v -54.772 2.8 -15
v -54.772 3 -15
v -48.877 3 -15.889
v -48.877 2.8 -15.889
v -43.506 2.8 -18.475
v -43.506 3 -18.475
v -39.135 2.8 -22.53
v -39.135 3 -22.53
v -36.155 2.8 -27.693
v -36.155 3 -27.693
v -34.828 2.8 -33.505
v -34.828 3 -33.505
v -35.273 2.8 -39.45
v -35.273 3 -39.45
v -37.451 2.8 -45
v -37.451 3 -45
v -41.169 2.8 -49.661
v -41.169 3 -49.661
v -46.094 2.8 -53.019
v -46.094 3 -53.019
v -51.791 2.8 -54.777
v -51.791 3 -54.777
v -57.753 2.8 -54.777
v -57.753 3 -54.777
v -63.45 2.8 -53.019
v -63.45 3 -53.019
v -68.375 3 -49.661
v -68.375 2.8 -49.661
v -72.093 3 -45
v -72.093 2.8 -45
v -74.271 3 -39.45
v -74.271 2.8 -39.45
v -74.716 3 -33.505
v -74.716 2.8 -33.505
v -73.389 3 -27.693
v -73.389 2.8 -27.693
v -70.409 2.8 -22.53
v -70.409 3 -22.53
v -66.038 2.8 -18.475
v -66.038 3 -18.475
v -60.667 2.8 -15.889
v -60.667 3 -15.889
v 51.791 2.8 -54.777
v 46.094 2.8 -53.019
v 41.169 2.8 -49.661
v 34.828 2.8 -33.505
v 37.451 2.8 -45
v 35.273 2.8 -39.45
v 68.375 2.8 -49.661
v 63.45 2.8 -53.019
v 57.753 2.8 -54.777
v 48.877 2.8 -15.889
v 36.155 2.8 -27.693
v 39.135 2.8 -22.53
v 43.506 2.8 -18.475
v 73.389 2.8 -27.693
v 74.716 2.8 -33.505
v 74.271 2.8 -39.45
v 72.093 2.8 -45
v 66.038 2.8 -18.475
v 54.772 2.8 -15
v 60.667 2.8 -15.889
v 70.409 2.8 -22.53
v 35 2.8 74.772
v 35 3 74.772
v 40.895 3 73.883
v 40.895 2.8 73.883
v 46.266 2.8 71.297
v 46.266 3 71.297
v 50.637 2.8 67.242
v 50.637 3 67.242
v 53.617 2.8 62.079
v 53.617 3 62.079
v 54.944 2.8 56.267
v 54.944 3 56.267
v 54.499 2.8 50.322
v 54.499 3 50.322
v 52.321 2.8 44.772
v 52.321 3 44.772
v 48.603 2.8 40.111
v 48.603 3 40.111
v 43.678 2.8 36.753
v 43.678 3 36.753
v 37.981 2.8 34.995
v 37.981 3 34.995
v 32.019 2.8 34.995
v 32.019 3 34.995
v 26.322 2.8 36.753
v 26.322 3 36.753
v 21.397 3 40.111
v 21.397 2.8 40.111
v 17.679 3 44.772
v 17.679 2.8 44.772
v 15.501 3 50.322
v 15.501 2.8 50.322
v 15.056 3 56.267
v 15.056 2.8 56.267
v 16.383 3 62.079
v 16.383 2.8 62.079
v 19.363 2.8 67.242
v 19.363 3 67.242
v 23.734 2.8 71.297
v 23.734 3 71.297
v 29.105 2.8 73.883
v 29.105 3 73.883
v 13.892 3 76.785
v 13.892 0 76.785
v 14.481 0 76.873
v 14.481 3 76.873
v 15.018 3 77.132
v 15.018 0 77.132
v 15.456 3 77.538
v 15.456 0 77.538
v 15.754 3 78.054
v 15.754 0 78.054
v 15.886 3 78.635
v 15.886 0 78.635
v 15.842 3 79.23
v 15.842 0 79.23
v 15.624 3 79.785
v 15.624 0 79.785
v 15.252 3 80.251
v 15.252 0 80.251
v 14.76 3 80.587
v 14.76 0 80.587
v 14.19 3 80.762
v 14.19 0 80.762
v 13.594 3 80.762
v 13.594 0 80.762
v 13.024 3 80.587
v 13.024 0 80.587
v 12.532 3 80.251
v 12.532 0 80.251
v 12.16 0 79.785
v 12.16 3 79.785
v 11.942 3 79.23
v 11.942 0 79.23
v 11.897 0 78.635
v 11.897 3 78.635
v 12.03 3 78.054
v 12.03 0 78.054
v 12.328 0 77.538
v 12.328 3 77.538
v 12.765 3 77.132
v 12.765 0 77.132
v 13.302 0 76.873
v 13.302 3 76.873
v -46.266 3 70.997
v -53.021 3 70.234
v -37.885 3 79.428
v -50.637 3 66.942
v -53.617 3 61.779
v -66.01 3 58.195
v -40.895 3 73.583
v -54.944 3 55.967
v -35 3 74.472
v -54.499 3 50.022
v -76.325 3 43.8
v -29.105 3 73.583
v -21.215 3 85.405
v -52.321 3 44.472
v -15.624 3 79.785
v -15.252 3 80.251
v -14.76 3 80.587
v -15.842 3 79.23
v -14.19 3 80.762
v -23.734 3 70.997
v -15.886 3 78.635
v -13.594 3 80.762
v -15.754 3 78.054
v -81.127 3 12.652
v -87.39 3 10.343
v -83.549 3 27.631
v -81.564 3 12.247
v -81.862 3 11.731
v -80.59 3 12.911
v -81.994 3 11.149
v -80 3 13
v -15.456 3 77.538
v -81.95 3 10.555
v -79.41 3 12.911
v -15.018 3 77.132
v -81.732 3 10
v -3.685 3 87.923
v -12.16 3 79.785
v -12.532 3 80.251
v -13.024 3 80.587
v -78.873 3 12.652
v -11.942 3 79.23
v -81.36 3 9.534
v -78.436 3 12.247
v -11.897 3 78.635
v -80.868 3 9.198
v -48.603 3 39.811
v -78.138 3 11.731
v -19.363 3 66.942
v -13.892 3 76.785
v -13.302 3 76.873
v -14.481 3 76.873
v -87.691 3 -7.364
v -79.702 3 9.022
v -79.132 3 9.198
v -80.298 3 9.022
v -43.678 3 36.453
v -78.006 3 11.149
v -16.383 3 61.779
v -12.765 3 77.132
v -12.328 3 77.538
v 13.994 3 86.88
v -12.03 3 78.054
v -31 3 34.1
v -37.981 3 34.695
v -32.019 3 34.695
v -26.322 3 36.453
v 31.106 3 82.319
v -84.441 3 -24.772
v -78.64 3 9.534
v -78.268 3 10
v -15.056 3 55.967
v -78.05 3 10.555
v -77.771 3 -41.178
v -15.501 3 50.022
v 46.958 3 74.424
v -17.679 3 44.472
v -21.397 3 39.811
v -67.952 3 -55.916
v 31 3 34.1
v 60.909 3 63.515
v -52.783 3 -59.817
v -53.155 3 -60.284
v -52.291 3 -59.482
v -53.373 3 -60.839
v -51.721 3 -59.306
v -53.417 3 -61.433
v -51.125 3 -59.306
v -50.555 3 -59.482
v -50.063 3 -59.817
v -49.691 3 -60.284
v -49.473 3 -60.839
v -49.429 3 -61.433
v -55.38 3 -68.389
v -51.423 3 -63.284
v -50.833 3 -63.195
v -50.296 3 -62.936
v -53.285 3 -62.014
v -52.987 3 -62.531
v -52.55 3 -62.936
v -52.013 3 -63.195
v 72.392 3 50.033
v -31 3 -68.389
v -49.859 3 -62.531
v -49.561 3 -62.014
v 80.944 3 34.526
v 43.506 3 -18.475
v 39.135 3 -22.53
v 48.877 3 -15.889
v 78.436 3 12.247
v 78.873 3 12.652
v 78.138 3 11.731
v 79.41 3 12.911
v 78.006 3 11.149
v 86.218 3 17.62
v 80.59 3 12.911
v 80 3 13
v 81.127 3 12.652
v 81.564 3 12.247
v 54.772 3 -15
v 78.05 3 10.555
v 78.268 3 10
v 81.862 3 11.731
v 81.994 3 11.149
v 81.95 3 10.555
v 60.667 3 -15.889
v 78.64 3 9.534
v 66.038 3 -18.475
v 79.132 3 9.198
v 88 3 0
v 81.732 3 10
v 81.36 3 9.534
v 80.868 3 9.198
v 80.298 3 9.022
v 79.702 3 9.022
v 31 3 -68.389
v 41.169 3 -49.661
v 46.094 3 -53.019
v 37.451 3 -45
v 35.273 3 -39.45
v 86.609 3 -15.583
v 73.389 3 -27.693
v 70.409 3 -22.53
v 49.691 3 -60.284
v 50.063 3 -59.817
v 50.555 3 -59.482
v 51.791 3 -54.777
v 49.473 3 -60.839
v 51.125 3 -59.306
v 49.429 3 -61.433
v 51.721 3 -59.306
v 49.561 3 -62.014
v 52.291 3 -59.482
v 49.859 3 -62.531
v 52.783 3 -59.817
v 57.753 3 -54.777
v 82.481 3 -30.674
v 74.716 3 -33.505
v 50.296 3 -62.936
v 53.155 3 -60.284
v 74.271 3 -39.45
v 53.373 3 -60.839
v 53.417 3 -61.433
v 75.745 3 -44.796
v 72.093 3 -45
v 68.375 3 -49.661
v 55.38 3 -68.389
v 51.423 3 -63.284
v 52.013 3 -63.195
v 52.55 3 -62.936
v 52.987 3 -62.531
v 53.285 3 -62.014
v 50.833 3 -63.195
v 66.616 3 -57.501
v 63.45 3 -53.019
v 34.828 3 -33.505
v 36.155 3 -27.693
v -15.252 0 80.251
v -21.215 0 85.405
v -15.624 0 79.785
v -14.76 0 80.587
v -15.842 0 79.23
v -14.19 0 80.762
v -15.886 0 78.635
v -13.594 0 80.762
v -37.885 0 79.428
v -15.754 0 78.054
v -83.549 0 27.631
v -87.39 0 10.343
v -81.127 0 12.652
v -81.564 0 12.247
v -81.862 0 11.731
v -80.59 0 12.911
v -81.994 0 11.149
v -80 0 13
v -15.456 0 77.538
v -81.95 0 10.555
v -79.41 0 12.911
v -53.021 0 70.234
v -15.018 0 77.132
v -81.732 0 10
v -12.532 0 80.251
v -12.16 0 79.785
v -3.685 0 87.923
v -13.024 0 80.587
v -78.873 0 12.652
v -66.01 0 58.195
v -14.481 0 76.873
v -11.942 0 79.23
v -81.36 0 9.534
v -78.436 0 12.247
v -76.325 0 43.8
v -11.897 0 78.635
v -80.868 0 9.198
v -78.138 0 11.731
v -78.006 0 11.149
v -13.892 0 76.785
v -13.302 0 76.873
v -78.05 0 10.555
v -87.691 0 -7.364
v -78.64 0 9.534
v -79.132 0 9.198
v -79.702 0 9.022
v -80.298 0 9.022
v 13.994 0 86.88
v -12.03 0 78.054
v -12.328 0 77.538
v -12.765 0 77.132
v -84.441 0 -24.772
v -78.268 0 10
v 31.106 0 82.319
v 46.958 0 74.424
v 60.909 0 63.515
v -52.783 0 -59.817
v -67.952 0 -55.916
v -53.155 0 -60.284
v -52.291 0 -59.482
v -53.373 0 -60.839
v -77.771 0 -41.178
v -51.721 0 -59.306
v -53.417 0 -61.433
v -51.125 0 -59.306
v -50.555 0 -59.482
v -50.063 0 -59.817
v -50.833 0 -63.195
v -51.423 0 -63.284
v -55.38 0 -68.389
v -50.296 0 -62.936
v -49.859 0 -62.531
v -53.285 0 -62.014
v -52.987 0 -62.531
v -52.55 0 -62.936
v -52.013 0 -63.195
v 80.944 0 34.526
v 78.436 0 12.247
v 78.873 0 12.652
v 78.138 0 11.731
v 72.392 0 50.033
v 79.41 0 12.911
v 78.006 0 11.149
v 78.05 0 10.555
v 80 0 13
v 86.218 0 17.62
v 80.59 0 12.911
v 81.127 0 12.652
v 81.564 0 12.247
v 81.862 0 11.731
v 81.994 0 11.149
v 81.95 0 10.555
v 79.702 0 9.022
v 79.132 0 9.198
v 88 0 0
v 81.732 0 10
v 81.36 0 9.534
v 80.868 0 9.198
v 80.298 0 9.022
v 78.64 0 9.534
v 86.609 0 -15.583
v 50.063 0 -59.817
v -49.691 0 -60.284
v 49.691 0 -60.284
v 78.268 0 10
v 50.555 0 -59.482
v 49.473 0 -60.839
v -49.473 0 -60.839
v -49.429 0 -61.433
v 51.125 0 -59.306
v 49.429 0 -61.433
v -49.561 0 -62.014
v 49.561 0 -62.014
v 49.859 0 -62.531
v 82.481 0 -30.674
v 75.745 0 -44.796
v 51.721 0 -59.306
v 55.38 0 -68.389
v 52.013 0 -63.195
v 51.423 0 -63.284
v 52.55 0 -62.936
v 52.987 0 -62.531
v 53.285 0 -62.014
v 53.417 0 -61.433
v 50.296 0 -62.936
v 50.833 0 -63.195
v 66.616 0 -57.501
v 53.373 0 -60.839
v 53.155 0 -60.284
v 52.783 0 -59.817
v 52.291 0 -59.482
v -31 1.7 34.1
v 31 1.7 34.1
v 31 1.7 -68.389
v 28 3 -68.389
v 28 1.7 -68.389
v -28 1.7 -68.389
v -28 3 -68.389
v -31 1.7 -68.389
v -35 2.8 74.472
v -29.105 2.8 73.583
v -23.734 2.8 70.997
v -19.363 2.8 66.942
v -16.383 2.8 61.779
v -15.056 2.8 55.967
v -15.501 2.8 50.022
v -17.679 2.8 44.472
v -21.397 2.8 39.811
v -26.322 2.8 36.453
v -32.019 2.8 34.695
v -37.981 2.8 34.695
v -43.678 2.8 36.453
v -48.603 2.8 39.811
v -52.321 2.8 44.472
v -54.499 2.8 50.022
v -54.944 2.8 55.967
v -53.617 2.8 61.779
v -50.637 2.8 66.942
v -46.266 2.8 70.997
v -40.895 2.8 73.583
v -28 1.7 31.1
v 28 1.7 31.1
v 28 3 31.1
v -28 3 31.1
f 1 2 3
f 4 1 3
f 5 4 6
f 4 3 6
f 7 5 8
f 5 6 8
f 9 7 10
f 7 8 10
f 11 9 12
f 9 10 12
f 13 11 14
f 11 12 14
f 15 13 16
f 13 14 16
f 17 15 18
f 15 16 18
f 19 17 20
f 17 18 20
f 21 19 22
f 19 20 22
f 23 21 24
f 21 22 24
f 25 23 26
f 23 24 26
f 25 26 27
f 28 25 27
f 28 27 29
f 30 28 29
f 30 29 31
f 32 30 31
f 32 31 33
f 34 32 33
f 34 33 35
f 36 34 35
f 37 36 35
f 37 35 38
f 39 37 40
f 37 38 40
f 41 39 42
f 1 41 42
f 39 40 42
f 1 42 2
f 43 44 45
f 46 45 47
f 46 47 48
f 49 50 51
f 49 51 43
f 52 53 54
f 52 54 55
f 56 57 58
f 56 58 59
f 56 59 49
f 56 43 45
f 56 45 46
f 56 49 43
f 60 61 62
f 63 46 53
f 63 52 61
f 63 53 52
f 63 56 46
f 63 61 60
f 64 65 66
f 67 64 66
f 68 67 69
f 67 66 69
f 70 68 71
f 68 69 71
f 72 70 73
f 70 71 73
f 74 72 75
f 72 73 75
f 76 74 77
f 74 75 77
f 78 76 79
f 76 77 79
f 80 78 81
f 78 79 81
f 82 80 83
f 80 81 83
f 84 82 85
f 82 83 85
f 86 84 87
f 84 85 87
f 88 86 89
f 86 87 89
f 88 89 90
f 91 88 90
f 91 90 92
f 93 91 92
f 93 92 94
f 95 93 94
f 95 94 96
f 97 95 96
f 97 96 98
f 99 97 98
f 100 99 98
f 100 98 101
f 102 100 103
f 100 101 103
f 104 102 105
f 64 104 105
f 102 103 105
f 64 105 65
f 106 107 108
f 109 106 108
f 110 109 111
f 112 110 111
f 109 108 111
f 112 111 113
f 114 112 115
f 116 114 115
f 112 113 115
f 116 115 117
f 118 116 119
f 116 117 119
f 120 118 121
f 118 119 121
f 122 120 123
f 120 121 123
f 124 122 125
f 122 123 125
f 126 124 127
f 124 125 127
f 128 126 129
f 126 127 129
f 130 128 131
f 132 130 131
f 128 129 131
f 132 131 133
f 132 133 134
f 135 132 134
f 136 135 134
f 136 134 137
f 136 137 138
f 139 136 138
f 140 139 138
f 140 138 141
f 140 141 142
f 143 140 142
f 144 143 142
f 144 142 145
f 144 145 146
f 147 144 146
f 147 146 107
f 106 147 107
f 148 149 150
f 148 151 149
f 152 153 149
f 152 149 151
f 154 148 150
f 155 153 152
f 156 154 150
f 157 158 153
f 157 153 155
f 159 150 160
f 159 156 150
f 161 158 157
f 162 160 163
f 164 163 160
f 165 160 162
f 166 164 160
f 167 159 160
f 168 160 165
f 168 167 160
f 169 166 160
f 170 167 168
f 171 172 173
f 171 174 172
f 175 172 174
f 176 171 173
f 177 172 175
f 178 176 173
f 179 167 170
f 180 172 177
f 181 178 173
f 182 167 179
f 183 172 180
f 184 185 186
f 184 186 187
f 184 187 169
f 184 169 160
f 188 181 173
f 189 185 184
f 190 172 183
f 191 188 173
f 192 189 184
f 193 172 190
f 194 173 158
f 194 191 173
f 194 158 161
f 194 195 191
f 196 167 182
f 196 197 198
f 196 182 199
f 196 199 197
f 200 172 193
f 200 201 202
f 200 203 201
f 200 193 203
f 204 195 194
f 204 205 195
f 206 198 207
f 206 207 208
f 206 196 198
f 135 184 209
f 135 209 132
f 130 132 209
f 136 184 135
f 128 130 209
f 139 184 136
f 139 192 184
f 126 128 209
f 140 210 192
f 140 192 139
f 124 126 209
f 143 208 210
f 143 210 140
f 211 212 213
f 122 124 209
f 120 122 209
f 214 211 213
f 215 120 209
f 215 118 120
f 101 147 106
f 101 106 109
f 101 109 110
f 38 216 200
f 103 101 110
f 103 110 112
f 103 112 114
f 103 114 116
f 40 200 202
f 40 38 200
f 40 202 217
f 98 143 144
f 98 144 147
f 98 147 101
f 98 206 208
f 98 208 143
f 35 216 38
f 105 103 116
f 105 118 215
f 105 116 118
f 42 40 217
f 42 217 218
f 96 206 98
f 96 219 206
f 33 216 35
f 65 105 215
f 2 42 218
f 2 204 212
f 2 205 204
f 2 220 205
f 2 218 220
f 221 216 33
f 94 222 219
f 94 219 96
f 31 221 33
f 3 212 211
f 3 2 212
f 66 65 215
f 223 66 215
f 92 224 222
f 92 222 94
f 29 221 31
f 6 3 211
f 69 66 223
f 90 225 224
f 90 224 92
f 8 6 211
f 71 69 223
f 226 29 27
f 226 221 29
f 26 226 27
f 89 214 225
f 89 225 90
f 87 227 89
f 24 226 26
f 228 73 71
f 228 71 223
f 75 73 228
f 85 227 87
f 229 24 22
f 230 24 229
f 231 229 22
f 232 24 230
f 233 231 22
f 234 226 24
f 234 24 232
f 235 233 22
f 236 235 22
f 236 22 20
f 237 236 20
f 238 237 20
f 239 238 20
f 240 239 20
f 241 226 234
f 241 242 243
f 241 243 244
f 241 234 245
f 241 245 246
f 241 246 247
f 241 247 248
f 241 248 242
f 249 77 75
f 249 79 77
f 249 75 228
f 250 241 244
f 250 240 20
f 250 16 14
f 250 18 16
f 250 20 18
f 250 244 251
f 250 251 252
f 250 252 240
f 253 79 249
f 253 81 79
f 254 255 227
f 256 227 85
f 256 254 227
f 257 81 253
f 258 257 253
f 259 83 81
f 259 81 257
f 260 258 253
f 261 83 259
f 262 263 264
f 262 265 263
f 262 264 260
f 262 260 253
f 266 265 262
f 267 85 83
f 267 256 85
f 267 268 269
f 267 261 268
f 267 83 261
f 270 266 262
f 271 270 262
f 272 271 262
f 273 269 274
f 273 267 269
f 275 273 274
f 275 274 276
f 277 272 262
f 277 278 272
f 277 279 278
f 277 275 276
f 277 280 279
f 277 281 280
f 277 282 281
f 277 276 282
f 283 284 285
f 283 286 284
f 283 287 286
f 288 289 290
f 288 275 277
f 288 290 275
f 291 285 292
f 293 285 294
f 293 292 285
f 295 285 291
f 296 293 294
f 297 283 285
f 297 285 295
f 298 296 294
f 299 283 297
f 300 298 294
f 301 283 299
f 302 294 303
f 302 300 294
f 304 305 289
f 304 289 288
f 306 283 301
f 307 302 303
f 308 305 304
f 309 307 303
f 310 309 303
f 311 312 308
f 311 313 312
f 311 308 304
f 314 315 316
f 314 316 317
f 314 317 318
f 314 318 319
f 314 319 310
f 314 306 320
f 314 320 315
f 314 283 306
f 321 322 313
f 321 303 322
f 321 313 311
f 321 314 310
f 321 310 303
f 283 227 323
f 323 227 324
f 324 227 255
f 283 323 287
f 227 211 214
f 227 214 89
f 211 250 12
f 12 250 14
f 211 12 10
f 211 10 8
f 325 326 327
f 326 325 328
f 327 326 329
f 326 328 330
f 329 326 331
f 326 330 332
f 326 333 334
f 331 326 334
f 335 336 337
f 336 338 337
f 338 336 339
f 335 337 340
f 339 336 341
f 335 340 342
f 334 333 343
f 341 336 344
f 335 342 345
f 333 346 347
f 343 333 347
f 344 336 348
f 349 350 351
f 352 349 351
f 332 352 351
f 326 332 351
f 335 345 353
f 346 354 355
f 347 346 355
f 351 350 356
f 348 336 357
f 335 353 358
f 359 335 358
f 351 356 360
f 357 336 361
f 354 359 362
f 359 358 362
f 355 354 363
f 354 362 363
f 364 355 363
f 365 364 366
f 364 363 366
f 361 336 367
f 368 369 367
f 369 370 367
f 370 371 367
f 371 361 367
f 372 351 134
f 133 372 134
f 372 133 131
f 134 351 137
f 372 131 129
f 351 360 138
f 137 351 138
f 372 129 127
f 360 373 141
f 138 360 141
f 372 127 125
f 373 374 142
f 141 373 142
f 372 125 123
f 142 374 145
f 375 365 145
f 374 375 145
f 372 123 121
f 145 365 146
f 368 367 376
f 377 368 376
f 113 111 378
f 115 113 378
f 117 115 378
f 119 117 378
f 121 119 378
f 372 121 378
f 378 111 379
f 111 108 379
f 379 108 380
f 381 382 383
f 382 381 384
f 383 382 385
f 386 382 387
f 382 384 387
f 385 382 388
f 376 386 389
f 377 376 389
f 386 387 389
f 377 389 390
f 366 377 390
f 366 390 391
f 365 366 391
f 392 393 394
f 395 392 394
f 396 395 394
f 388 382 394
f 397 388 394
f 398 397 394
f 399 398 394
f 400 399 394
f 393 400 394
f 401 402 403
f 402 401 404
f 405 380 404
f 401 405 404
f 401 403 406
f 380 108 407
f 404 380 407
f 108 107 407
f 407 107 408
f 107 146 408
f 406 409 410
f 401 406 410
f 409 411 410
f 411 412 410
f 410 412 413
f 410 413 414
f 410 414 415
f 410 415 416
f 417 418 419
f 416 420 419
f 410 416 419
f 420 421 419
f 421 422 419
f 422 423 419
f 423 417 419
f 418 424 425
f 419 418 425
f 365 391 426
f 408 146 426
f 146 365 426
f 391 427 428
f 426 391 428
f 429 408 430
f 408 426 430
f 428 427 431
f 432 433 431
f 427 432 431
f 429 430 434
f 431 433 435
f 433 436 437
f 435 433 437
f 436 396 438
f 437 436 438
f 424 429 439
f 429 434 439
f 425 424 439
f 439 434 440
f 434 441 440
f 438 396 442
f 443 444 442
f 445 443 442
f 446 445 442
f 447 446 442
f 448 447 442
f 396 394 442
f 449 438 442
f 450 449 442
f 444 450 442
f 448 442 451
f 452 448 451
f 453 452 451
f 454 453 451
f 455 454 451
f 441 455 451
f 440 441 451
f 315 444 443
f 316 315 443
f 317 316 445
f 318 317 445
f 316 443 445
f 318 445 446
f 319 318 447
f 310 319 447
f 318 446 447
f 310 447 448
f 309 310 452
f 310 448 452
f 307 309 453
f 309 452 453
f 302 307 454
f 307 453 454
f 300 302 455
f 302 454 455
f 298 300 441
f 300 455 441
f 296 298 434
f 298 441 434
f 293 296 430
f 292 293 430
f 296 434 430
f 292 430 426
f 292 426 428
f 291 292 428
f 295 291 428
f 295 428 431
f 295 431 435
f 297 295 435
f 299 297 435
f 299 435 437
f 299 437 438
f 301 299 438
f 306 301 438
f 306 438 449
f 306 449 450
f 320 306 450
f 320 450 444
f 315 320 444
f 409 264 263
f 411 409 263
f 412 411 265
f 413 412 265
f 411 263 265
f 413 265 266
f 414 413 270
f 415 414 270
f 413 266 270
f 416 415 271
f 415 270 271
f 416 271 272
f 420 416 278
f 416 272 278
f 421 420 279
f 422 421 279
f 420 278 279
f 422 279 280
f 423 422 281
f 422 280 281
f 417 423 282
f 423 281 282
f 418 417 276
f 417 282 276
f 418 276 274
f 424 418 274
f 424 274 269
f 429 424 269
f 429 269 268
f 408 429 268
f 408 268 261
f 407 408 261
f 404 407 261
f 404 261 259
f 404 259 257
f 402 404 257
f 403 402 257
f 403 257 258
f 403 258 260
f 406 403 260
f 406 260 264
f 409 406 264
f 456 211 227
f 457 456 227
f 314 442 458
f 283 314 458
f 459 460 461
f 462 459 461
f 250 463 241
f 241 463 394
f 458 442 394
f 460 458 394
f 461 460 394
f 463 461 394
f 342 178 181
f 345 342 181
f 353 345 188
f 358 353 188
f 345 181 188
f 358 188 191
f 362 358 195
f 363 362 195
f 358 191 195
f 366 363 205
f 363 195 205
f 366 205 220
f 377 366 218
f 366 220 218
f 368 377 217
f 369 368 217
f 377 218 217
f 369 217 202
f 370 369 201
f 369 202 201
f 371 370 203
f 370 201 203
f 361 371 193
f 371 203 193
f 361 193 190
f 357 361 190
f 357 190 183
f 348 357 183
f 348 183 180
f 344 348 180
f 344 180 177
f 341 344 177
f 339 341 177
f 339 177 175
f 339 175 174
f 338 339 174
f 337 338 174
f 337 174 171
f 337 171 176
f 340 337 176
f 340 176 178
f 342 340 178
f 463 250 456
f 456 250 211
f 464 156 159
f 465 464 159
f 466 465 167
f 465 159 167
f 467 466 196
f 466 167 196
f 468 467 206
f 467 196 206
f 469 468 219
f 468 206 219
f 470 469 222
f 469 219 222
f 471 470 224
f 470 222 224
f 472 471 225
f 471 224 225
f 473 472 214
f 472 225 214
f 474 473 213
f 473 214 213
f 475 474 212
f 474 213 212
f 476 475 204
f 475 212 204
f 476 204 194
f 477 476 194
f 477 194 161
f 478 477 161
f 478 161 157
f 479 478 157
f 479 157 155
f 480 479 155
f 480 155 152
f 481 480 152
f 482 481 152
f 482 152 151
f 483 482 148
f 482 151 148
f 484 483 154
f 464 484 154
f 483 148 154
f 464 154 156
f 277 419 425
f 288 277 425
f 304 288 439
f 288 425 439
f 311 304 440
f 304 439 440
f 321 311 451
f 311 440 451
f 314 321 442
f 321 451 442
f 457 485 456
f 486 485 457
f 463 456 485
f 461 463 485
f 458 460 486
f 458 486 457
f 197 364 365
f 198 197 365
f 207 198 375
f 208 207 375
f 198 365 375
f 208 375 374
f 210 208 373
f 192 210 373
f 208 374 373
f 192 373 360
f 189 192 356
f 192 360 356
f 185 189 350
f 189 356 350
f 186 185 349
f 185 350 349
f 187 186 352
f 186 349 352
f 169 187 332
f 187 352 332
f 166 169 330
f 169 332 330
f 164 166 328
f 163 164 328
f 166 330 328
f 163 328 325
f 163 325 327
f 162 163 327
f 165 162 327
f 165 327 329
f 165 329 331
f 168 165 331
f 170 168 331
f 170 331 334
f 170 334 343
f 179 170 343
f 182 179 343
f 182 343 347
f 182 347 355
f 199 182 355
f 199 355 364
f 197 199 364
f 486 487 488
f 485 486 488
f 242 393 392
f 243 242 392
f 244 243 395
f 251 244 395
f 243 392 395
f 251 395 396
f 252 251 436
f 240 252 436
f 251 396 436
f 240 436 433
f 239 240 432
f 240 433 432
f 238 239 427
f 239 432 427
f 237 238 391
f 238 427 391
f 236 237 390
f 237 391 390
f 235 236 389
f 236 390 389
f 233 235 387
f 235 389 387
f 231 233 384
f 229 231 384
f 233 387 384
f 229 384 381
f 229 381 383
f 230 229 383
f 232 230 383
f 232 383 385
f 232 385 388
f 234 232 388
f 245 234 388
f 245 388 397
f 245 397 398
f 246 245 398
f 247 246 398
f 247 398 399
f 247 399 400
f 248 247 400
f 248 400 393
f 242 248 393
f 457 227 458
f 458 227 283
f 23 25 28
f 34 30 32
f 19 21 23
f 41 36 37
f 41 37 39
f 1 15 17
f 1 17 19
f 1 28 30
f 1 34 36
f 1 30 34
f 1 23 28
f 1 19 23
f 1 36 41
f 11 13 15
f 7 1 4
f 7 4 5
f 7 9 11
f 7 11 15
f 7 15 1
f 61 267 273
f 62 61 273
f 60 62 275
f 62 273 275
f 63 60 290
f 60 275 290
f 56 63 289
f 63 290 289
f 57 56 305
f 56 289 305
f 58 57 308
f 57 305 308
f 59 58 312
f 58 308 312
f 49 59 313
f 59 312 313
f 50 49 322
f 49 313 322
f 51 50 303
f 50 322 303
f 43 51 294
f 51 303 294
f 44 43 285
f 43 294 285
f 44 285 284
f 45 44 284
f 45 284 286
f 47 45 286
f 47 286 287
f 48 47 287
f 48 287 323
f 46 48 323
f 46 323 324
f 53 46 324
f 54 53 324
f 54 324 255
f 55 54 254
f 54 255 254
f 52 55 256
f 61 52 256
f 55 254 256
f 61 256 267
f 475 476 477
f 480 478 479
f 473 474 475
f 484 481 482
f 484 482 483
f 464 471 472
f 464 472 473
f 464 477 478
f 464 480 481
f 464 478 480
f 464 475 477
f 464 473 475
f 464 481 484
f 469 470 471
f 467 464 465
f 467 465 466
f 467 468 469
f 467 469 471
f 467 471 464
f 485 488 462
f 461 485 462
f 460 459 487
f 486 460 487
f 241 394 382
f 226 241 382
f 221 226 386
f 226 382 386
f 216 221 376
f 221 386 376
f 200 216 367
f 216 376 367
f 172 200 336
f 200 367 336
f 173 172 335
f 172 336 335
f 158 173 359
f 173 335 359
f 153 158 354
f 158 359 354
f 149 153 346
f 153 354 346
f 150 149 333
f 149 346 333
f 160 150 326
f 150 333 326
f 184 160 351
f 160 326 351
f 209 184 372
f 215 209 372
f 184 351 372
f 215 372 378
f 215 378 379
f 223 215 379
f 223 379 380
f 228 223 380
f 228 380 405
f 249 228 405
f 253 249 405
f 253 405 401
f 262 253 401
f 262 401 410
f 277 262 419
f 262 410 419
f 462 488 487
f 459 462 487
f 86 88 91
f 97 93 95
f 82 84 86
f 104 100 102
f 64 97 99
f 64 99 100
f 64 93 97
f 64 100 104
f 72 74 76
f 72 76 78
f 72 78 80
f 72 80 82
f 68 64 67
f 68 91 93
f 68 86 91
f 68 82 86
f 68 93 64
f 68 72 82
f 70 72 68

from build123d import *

# Parameters (mm, degrees)
BOSS_EXTRUDE1_DEPTH   = 3
CUT_EXTRUDE2_DEPTH    = 1.3
SKETCH4_R             = 20
CUT_EXTRUDE3_DEPTH    = 0.2
F_4_0MM_DOWEL_HOLE1_D = 4
SKETCH8_R             = 2
CUT_EXTRUDE4_DEPTH    = 19


with BuildPart() as part:
    # Sketch1 → Boss-Extrude1 (new body)
    with BuildSketch(Plane(origin=(0, 0, 0), x_dir=(1, 0, 0), z_dir=(0, 1, 0))):
        with BuildLine():
            Line((55.380194412, 68.388844608), (0, 68.388844608))
            Line((0, 68.388844608), (-55.380194412, 68.388844608))
            ThreePointArc((-55.380194412, 68.388844608), (-37.884976519, -79.427505023), (88, 0))
            ThreePointArc((88, 0), (79.427505023, 37.884976519), (55.380194412, 68.388844608))
        make_face()
    extrude(amount=BOSS_EXTRUDE1_DEPTH)

    # Sketch3 → Cut-Extrude2 (cut)
    with BuildSketch(Plane(origin=(0, 3, 0), x_dir=(1, 0, 0), z_dir=(0, 1, 0))):
        Polygon((28, -31.1), (0, -31.1), (-28, -31.1), (-28, 68.388844608), (-31, 68.388844608), (-31, -34.1), (31, -34.1), (31, 68.388844608), (28, 68.388844608), align=None)
    extrude(amount=-CUT_EXTRUDE2_DEPTH, mode=Mode.SUBTRACT)

    # Sketch4 → Cut-Extrude3 (cut)
    with BuildSketch(Plane(origin=(0, 3, 0), x_dir=(1, 0, 0), z_dir=(0, 1, 0))):
        with Locations(Location((35, -54.772, 0), (0, 0, 270))):
            Circle(SKETCH4_R)
        with Locations(Location((-35, -54.472, 0), (0, 0, 270))):
            Circle(SKETCH4_R)
        with Locations(Location((54.772, 35, 0), (0, 0, 270))):
            Circle(SKETCH4_R)
        with Locations(Location((-54.772, 35, 0), (0, 0, 270))):
            Circle(SKETCH4_R)
    extrude(amount=-CUT_EXTRUDE3_DEPTH, mode=Mode.SUBTRACT)

    # Ø4.0mm Dowel Hole1 (through all)
    with Locations(Plane(origin=(-51.423008775, 3, -61.28355545), x_dir=(0, 0, 1), z_dir=(0, 1, 0))):
        with Locations((0, 0), (0, 102.84601755), (140.068175691, 65.314862988), (140.068175691, 37.531154562)):
            Hole(F_4_0MM_DOWEL_HOLE1_D / 2)

    # Sketch8 → Cut-Extrude4 (cut)
    with BuildSketch(Plane(origin=(0, 3, 0), x_dir=(1, 0, 0), z_dir=(0, 1, 0))):
        with Locations(Location((-80, -11, 0), (0, 0, 270))):
            Circle(SKETCH8_R)
        with Locations(Location((80, -11, 0), (0, 0, 270))):
            Circle(SKETCH8_R)
    extrude(amount=-CUT_EXTRUDE4_DEPTH, mode=Mode.SUBTRACT)


solid = part.part
